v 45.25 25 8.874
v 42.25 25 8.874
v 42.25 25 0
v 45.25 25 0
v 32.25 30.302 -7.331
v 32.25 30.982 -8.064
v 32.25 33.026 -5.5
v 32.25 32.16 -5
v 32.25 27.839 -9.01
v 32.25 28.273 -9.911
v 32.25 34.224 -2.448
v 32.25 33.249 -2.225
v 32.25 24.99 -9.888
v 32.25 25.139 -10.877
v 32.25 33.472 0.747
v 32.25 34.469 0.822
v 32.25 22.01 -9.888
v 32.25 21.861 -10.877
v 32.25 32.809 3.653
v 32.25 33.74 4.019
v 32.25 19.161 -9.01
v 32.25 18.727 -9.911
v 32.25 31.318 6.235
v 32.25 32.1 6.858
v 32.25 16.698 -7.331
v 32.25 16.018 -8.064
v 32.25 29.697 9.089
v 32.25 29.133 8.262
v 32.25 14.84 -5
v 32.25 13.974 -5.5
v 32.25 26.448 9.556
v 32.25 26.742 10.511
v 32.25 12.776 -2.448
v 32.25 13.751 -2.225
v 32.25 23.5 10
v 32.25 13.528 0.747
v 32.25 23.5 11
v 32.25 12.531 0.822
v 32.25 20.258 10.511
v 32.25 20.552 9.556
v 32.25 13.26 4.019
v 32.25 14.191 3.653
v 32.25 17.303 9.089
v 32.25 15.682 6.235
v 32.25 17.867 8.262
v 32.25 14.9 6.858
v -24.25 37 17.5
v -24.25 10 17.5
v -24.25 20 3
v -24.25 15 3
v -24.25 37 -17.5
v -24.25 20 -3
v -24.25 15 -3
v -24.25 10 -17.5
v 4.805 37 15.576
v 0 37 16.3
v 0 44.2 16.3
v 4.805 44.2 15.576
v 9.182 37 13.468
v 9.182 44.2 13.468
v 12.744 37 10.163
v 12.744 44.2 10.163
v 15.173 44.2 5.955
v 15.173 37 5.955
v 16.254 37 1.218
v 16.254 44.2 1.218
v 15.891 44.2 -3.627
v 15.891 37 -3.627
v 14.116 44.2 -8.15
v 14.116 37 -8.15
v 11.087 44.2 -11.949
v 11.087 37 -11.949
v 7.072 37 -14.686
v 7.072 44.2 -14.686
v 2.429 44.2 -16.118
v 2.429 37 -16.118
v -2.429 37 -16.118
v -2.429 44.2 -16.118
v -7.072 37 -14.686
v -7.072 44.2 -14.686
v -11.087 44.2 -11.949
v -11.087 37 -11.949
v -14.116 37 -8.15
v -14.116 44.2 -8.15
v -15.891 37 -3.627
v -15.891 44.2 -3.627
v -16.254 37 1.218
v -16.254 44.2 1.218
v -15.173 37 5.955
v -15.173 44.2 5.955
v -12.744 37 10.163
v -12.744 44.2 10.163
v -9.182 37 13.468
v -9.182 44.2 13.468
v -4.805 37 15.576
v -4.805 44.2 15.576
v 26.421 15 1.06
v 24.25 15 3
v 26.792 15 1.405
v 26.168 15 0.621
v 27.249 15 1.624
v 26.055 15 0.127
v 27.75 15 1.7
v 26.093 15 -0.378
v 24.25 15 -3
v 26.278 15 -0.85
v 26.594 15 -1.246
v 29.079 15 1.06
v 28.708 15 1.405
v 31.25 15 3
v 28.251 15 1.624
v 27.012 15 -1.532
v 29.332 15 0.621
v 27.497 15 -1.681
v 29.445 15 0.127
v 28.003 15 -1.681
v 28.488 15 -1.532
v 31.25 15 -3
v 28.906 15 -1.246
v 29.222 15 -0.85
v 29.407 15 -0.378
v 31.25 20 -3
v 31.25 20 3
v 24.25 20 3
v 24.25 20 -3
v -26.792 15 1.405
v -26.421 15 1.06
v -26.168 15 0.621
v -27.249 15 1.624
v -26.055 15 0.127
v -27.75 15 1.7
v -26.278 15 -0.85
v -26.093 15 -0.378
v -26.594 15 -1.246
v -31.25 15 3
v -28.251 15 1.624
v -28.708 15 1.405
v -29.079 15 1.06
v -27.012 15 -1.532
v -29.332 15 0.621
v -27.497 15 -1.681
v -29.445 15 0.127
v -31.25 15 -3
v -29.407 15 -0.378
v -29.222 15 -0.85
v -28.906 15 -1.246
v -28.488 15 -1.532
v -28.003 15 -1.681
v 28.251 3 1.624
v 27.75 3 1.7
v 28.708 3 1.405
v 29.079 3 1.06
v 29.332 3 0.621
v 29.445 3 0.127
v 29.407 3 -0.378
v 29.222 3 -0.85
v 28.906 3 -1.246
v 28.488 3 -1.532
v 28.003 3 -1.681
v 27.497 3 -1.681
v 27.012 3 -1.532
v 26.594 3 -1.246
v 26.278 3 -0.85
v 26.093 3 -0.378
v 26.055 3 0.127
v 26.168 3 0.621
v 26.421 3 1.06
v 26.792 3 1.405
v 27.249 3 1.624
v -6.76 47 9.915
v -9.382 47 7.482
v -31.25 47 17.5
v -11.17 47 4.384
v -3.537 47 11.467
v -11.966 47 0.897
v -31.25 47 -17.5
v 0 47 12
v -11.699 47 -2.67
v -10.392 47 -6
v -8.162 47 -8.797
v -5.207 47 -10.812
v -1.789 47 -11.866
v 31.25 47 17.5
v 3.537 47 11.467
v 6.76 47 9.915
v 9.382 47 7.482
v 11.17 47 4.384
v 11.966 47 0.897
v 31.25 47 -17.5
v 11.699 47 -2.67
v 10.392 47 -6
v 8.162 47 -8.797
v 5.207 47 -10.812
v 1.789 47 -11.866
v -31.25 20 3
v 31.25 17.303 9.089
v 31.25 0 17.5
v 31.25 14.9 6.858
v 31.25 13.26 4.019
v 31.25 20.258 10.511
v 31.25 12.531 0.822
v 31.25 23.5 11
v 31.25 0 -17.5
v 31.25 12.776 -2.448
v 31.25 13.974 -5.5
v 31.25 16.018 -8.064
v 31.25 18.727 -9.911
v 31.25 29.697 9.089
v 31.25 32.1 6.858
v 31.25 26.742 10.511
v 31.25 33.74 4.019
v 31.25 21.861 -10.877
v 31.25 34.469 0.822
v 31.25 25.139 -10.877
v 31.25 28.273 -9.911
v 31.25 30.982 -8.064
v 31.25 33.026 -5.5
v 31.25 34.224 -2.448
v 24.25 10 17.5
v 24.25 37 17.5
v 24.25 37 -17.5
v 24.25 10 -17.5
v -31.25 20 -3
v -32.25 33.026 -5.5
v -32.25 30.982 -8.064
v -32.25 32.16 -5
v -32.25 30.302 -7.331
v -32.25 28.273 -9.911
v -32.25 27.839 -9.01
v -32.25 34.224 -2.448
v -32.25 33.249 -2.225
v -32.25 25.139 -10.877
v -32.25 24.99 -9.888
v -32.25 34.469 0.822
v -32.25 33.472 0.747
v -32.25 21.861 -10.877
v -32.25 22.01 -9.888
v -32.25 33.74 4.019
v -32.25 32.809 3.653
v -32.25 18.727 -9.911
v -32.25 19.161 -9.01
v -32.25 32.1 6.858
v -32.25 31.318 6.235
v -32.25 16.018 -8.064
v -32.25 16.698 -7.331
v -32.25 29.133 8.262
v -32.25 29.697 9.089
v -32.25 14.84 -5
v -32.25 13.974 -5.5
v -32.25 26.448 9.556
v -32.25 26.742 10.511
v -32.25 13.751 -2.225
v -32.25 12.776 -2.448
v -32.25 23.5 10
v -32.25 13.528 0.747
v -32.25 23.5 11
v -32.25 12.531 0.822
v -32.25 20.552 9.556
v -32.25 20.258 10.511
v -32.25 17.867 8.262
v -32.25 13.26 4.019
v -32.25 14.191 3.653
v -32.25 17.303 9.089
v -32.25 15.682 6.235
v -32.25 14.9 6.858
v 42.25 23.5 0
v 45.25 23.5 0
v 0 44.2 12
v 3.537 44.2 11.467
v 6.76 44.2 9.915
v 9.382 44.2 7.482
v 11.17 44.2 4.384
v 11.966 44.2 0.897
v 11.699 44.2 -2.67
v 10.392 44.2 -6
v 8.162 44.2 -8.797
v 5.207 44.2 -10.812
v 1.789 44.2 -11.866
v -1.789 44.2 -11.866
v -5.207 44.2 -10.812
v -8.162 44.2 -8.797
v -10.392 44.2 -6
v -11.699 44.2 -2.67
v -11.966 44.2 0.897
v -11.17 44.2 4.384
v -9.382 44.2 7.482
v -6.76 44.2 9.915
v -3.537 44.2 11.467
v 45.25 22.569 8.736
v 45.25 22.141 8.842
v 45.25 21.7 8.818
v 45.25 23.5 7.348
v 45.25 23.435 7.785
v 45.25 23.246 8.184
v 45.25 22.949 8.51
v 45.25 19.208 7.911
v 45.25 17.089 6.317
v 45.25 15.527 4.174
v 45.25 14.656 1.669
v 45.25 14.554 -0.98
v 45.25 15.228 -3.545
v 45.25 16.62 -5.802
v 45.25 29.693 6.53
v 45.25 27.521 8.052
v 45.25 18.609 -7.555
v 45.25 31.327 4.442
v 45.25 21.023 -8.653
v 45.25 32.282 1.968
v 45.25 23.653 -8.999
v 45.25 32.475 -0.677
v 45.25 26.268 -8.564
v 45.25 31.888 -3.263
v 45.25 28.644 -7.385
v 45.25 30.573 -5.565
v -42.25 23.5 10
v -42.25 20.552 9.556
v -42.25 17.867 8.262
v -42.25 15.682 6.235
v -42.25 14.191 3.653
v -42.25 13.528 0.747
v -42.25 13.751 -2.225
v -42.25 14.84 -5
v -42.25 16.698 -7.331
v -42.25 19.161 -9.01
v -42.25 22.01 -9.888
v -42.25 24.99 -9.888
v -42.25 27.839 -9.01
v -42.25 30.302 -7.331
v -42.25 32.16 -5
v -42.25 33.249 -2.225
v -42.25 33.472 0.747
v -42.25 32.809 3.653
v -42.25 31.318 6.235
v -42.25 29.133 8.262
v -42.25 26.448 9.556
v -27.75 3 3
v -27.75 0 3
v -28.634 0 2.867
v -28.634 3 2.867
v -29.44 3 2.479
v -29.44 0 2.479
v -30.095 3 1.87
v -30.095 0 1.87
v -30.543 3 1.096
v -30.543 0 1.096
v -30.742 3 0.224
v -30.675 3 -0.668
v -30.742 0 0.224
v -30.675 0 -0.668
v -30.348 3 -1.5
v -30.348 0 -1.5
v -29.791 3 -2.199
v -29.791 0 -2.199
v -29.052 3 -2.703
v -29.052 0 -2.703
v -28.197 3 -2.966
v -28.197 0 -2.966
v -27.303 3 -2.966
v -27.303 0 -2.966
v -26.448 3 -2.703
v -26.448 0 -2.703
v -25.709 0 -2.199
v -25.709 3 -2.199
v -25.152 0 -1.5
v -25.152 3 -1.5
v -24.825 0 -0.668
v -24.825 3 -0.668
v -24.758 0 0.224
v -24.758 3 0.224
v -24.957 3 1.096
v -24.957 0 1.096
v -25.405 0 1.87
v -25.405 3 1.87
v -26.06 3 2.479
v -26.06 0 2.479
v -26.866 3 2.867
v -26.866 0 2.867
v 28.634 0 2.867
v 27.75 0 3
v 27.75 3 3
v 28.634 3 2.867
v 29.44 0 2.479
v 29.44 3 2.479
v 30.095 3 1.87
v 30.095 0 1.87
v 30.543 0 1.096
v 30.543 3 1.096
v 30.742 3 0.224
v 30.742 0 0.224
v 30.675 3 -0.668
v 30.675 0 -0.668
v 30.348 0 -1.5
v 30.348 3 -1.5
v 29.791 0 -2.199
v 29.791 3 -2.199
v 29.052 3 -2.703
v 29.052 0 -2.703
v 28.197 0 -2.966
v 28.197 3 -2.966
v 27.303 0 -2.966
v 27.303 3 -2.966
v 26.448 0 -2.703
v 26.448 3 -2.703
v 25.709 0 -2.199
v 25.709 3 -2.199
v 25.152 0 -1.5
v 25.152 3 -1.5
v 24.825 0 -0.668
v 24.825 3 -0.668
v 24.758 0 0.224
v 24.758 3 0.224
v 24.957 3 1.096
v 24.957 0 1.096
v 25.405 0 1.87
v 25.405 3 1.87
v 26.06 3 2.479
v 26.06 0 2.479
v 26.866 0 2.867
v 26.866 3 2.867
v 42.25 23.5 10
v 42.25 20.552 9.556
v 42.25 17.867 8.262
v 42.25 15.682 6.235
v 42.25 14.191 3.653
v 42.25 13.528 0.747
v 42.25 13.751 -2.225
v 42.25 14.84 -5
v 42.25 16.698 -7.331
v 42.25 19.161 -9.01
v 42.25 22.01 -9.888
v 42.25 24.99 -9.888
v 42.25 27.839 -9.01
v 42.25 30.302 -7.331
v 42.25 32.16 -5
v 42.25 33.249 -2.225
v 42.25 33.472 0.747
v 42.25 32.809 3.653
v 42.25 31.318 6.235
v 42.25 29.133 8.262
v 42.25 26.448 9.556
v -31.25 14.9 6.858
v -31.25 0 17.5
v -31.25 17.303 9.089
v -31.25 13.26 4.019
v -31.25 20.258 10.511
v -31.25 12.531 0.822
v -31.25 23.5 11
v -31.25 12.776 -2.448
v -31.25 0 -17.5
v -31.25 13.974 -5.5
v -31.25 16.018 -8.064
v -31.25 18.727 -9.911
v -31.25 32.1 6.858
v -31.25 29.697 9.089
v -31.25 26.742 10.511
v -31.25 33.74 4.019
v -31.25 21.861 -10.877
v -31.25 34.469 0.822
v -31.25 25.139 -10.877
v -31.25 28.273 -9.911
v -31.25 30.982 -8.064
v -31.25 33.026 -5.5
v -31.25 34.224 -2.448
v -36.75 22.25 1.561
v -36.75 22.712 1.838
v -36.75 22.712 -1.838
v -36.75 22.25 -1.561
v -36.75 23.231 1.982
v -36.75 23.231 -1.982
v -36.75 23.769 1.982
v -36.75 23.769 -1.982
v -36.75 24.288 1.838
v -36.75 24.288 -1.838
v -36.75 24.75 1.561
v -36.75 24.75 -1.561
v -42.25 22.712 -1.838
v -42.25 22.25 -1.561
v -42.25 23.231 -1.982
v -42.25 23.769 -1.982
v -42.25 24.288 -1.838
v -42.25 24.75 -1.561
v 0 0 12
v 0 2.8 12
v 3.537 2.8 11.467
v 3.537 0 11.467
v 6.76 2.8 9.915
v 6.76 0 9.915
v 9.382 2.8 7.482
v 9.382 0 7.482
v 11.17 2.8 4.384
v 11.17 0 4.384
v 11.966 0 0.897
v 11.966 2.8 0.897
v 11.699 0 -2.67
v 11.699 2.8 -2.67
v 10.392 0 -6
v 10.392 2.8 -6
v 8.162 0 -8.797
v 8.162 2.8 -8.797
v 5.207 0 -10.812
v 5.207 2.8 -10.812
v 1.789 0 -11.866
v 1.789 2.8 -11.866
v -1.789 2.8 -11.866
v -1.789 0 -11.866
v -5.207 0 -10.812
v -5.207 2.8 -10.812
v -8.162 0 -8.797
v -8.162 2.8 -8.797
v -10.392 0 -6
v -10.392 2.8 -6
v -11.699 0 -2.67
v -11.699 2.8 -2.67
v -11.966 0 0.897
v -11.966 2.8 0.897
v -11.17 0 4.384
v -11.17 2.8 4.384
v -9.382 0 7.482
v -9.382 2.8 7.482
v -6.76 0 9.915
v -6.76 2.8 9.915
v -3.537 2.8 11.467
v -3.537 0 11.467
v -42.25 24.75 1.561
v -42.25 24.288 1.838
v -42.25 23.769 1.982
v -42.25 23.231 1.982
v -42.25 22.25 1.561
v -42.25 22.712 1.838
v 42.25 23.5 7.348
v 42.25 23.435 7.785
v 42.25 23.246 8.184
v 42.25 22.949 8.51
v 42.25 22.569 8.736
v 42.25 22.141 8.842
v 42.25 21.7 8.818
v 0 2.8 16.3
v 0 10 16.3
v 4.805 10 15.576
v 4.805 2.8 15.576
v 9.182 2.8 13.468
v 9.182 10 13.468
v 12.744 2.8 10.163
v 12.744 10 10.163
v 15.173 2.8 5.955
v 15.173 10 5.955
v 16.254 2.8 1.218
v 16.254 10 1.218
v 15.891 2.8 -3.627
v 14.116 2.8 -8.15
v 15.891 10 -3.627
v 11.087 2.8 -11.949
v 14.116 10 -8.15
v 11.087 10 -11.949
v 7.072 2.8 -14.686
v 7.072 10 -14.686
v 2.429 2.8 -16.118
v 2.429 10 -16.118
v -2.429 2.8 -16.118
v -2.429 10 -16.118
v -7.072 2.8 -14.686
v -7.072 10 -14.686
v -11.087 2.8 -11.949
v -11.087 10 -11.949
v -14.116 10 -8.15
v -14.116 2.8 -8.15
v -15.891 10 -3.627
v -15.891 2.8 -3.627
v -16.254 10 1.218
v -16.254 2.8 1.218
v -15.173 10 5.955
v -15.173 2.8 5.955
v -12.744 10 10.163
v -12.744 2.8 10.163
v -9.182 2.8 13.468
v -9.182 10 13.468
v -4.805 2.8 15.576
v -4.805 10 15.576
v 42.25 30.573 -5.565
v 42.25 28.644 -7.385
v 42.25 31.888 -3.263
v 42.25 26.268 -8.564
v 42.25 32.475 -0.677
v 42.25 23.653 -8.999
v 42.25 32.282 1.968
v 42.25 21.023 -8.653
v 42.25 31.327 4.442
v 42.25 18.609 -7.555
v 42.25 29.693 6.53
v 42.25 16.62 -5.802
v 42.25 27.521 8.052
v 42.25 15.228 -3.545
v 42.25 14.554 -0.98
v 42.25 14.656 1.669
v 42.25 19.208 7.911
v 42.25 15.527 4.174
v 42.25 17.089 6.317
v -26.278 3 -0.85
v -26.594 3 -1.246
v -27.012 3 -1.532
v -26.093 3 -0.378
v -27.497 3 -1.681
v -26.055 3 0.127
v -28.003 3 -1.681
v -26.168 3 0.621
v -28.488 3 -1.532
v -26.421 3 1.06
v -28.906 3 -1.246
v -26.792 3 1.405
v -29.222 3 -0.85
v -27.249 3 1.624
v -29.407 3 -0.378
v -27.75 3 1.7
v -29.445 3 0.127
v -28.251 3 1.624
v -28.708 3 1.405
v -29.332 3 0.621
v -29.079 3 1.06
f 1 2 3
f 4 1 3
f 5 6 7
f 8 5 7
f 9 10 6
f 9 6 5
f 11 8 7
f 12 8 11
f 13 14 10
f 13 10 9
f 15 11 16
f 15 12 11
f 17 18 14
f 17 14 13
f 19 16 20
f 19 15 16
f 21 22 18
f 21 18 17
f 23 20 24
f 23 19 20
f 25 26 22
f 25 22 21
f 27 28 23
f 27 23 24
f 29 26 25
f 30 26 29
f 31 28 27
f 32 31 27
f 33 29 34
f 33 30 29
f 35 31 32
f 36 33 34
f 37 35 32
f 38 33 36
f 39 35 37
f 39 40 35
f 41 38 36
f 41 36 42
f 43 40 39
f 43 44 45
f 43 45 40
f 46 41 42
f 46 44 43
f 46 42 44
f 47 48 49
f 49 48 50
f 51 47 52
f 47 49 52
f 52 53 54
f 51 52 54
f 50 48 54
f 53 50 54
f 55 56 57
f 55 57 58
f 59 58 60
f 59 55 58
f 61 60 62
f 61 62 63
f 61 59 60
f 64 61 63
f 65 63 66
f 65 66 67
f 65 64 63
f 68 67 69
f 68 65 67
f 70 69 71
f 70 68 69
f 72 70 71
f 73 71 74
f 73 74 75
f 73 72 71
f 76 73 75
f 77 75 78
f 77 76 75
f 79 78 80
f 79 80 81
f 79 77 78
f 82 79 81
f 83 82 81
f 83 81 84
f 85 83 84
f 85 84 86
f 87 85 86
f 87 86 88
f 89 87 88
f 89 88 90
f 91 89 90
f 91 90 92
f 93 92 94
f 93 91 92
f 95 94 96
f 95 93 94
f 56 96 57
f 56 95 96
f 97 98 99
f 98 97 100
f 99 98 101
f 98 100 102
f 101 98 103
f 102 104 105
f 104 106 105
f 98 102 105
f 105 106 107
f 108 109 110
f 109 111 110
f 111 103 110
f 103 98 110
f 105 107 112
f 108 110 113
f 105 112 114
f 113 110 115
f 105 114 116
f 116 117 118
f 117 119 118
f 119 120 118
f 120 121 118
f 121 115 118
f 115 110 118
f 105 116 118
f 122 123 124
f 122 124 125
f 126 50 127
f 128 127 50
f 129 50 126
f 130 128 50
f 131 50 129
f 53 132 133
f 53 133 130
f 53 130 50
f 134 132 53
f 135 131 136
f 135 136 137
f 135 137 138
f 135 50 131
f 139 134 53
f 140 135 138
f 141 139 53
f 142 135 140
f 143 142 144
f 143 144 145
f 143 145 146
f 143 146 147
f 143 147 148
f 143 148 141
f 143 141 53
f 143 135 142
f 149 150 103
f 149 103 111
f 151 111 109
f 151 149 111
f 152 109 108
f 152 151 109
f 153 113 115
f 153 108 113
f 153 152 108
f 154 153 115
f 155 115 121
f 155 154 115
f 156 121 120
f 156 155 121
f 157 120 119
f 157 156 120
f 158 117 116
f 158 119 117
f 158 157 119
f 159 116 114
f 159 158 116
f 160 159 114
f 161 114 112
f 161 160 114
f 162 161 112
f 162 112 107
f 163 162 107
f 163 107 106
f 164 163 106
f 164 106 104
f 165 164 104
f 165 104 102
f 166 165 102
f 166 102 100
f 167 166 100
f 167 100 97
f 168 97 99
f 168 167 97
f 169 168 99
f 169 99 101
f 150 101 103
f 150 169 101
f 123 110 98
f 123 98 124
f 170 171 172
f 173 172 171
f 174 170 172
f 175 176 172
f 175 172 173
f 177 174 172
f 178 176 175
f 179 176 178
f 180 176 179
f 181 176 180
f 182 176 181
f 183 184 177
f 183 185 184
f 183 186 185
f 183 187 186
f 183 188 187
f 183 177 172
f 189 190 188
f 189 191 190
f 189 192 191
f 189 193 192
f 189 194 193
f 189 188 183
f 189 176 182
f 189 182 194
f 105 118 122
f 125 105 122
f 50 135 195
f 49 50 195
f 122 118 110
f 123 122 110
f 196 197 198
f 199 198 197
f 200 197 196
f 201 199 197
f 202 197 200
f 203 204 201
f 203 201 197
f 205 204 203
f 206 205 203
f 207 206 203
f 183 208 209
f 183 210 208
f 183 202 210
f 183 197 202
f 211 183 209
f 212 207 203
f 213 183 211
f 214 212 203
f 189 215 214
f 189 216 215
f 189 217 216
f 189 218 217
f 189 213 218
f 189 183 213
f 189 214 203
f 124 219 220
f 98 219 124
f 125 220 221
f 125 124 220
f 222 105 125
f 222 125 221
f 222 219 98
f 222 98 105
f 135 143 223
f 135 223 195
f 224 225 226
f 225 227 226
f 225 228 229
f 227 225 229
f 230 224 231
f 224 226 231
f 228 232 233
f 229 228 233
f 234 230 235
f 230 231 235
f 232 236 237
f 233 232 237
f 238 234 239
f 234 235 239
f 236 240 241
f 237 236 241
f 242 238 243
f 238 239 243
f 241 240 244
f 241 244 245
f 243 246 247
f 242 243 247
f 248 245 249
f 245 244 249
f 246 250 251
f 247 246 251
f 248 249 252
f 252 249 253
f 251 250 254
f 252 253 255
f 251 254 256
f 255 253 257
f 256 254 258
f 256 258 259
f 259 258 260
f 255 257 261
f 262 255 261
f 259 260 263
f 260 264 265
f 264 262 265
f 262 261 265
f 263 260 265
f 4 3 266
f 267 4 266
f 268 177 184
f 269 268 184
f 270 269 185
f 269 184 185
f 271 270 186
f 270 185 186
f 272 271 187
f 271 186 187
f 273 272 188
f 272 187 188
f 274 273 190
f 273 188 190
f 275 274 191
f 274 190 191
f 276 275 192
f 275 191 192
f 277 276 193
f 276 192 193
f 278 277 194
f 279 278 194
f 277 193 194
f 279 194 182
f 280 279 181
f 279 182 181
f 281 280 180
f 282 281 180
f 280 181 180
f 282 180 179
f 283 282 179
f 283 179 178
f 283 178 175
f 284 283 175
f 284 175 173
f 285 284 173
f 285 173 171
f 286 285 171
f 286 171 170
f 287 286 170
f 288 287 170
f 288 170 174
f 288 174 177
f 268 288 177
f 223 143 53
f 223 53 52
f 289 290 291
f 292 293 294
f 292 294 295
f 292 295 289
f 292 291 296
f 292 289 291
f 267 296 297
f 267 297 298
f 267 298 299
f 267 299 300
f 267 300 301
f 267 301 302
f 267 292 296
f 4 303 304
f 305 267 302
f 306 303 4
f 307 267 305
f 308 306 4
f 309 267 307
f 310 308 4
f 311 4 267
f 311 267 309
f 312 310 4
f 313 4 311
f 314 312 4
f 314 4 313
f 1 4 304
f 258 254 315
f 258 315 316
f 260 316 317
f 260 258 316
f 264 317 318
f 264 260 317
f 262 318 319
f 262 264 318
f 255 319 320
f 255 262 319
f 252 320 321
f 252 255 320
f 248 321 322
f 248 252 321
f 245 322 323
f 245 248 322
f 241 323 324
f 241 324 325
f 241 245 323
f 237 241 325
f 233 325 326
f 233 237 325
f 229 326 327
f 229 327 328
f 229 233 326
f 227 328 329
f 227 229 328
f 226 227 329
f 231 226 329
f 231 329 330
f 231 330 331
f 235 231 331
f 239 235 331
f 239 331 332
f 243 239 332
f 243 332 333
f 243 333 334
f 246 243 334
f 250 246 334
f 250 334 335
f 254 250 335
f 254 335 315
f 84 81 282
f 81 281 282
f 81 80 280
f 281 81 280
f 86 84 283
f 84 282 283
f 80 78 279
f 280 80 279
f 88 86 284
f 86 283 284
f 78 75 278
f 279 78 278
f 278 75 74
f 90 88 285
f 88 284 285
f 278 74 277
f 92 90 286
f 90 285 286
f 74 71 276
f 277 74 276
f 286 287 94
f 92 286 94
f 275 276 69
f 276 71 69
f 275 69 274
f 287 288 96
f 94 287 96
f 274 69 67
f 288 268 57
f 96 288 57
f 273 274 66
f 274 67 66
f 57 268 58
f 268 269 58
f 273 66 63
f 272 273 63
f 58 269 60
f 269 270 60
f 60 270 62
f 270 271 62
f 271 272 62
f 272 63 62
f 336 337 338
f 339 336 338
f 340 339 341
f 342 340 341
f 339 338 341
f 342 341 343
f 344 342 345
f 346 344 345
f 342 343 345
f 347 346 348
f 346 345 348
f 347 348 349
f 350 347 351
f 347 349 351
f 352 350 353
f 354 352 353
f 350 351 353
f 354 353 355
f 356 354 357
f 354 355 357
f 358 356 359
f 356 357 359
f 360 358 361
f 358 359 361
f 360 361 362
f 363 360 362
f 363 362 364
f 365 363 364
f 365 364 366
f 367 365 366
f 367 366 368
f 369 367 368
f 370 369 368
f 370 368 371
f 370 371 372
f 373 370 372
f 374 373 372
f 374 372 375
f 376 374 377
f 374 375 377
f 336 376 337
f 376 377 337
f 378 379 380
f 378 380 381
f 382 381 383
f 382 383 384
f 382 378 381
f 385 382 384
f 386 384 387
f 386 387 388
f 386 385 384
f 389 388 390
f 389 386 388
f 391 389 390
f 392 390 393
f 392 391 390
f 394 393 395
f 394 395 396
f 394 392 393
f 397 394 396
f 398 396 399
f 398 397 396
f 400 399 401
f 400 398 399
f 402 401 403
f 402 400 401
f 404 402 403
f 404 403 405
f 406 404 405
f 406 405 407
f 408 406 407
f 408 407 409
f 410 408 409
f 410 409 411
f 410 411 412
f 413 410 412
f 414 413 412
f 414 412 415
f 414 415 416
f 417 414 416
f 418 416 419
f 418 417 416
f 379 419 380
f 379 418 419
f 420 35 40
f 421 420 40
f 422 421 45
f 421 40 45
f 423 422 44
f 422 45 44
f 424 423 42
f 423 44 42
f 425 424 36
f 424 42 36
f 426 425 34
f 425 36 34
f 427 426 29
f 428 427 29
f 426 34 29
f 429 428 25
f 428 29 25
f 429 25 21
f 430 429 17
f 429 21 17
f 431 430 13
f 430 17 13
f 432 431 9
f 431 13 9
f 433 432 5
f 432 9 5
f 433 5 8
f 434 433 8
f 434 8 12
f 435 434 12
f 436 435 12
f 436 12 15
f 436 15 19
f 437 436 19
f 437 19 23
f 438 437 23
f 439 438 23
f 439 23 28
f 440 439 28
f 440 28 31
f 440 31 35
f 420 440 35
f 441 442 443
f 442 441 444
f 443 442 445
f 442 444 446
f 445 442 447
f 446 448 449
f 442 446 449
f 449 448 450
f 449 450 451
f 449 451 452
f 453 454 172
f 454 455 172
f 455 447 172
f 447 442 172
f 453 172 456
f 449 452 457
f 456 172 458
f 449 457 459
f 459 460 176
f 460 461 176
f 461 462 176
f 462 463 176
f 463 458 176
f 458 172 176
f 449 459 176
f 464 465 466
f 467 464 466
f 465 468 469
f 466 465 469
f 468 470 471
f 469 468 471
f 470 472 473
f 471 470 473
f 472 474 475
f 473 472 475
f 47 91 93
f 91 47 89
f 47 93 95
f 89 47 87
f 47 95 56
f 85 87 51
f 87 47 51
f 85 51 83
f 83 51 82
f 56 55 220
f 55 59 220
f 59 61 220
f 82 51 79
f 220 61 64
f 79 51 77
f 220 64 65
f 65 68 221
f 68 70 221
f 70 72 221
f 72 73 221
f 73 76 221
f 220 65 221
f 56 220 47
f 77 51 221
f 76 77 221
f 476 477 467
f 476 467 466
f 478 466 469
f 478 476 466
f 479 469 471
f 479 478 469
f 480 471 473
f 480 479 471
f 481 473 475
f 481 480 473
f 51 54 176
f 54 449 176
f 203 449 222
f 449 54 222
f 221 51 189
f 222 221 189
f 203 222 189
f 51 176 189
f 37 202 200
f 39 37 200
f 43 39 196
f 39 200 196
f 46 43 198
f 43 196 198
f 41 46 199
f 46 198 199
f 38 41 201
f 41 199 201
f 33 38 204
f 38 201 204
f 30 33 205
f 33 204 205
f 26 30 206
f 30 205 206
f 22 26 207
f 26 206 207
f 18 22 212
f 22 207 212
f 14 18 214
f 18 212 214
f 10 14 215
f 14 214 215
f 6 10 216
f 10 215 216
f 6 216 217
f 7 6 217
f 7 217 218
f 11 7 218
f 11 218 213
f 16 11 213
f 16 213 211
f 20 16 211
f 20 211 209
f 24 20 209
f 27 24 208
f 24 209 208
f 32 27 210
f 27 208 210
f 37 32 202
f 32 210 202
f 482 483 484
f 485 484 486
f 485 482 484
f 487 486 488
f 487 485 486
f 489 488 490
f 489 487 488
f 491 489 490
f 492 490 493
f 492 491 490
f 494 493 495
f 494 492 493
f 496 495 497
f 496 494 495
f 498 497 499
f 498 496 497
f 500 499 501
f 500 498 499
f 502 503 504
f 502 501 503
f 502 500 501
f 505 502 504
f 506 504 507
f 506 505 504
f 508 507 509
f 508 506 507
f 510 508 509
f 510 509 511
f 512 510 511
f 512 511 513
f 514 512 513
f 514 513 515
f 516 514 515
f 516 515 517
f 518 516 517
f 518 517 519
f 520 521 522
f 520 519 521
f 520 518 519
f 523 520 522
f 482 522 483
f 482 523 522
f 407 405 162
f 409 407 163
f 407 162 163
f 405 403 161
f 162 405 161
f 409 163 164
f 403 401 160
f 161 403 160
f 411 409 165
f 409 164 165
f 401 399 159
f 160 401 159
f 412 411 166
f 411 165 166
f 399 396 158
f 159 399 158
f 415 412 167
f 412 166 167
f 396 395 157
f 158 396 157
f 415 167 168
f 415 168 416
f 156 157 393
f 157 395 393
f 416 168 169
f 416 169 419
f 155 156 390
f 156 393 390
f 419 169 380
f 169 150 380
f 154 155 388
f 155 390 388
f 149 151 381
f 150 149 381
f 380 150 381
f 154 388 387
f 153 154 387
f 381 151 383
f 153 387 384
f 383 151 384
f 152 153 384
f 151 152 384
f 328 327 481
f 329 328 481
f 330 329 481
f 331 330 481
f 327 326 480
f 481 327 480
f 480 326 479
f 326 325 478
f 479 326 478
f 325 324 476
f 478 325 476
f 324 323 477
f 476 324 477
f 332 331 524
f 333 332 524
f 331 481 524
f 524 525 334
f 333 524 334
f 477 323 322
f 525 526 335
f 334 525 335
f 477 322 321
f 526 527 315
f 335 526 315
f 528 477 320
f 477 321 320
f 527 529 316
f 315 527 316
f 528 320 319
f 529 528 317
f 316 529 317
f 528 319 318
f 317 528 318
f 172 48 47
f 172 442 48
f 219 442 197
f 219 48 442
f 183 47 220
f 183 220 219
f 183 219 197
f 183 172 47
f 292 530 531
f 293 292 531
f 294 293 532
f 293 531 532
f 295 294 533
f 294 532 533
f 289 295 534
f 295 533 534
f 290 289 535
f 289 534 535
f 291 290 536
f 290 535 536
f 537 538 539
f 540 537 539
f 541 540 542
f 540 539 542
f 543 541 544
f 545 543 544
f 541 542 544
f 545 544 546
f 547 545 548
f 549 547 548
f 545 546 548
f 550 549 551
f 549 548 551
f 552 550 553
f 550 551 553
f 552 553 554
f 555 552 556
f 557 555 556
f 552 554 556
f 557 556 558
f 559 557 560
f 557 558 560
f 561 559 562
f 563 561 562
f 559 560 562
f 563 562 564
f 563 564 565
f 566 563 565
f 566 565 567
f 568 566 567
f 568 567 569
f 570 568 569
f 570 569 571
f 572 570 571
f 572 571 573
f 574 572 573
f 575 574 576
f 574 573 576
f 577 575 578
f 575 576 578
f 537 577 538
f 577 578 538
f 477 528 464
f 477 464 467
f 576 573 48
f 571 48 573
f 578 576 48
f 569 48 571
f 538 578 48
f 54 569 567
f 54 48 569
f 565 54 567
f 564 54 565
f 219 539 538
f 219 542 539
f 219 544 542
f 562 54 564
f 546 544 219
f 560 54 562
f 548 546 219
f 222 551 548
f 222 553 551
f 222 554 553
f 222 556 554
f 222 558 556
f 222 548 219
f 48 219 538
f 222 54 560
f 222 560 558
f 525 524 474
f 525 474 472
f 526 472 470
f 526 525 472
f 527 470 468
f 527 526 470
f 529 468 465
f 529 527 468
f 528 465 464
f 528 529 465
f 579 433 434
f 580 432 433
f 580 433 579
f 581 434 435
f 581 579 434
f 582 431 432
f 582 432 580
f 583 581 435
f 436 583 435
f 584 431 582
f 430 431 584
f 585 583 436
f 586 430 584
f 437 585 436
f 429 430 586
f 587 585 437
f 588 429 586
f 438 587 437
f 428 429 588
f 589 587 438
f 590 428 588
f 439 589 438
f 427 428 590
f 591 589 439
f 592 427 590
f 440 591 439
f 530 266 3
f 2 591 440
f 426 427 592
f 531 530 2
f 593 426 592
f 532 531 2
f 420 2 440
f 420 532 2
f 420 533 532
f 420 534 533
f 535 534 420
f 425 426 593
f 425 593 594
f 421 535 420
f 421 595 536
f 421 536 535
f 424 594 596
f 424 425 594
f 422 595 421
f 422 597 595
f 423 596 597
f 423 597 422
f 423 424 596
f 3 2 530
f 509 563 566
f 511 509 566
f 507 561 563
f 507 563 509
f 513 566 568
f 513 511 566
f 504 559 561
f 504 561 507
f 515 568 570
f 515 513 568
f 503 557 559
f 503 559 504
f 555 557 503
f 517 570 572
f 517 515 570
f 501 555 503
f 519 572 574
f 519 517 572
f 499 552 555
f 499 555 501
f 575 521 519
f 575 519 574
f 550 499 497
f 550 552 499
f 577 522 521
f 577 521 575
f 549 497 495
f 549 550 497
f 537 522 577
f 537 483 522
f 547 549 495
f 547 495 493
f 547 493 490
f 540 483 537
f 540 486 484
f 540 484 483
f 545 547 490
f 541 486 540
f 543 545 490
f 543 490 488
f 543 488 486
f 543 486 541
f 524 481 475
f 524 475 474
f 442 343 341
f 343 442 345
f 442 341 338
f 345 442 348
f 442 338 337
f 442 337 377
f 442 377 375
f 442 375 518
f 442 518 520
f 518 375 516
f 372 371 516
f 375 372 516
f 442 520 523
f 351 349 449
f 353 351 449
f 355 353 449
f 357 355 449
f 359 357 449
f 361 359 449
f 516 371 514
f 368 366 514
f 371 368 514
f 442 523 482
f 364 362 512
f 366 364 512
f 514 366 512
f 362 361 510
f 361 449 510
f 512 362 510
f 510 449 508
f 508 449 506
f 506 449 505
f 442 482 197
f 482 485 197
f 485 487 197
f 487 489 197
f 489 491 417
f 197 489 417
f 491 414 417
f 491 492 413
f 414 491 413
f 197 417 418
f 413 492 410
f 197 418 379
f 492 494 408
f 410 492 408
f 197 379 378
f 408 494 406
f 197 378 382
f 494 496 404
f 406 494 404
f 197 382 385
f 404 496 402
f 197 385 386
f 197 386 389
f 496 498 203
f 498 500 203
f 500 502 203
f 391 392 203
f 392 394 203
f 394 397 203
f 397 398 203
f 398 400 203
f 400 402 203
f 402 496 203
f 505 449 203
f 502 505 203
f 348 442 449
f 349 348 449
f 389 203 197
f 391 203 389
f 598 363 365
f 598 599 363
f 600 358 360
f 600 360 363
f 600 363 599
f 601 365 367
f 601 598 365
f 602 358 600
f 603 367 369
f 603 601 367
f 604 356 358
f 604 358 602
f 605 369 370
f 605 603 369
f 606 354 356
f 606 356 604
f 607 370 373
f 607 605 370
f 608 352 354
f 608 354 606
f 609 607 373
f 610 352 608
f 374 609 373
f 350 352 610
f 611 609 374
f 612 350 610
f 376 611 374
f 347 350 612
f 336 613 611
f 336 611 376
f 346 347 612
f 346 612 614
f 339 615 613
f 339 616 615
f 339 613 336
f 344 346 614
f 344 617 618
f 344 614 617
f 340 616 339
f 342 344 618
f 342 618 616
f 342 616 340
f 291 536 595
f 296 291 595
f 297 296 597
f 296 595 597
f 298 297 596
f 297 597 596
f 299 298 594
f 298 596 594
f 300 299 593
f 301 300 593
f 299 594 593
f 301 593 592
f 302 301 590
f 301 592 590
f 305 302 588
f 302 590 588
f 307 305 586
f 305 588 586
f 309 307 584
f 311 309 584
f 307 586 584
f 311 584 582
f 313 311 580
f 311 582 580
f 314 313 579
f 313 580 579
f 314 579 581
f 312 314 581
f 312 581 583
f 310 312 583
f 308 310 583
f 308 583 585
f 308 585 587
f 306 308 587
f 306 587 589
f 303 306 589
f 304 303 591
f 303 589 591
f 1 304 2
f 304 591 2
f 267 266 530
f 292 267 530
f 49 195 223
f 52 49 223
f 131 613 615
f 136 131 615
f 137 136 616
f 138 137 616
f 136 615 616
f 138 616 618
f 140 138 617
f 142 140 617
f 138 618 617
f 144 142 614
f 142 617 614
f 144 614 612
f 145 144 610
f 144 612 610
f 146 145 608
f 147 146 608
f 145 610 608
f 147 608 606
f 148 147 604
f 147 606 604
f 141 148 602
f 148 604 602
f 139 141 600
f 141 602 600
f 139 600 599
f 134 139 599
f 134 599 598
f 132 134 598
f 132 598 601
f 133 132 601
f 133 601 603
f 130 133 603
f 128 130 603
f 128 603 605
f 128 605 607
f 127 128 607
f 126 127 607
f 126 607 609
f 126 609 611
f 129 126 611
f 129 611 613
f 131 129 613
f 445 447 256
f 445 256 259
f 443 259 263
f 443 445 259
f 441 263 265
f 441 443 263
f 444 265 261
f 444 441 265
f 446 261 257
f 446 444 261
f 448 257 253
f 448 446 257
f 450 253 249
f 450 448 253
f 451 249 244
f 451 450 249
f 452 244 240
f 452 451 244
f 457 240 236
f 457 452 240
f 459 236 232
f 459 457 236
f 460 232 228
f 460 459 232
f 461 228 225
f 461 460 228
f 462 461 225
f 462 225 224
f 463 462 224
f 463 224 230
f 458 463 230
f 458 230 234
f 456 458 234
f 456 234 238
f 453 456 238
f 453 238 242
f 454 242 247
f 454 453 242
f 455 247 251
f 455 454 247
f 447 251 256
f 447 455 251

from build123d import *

# Parameters (mm, degrees)
SKETCH_1_W          = 62.5
SKETCH_1_H          = 35
SKETCH_1_R          = 12
EXTRUDE_1_DEPTH     = 10
SKETCH_2_R          = 16.3
CUT_EXTRUDE_1_DEPTH = 7.2
SKETCH_4_W          = 7
SKETCH_4_H          = 35
EXTRUDE_3_DEPTH     = 37
SKETCH_5_R          = 3
CUT_EXTRUDE_3_DEPTH = 3
SKETCH_7_R          = 1.7
CUT_EXTRUDE_4_DEPTH = 20
SKETCH_9_W          = 6
SKETCH_9_H          = 5
CUT_EXTRUDE_5_DEPTH = 7
SKETCH_10_R         = 10
EXTRUDE_4_DEPTH     = 11
SKETCH_11_R         = 11
EXTRUDE_5_DEPTH     = 1
EXTRUDE_6_DEPTH     = 3
CUT_EXTRUDE_6_DEPTH = 5.5


with BuildPart() as part:
    # 草图1 → 凸台-拉伸1 (new body)
    with BuildSketch(Plane(origin=(0, 0, 0), x_dir=(1, 0, 0), z_dir=(0, 1, 0))):
        Rectangle(SKETCH_1_W, SKETCH_1_H)
        with Locations(Location((0, 0, 0), (0, 0, 270))):
            Circle(SKETCH_1_R, mode=Mode.SUBTRACT)
    extrude_1 = extrude(amount=EXTRUDE_1_DEPTH)

    # 草图2 → 切除-拉伸1 (cut)
    with BuildSketch(Plane(origin=(0, 10, 0), x_dir=(1, 0, 0), z_dir=(0, 1, 0))):
        with Locations(Location((0, 0, 0), (0, 0, 270))):
            Circle(SKETCH_2_R)
    cut_extrude_1 = extrude(amount=-CUT_EXTRUDE_1_DEPTH, mode=Mode.SUBTRACT)

    # 草图4 → 凸台-拉伸3 (add)
    with BuildSketch(Plane(origin=(0, 0, 0), x_dir=(1, 0, 0), z_dir=(0, 1, 0))):
        with Locations((27.75, 0)):
            Rectangle(SKETCH_4_W, SKETCH_4_H)
    extrude_3 = extrude(amount=EXTRUDE_3_DEPTH)

    # 草图5 → 切除-拉伸3 (cut)
    with BuildSketch(Plane(origin=(0, 0, 0), x_dir=(1, 0, 0), z_dir=(0, 1, 0))):
        with Locations(Location((27.75, 0, 0), (0, 0, 270))):
            Circle(SKETCH_5_R)
    cut_extrude_3 = extrude(amount=CUT_EXTRUDE_3_DEPTH, mode=Mode.SUBTRACT)

    # 草图7 → 切除-拉伸4 (cut)
    with BuildSketch(Plane(origin=(0, 0, 0), x_dir=(1, 0, 0), z_dir=(0, 1, 0))):
        with Locations(Location((27.75, 0, 0), (0, 0, 270))):
            Circle(SKETCH_7_R)
    cut_extrude_4 = extrude(amount=CUT_EXTRUDE_4_DEPTH, mode=Mode.SUBTRACT)

    # 草图9 → 切除-拉伸5 (cut)
    with BuildSketch(Plane(origin=(31.25, 0, 0), x_dir=(0, 0, -1), z_dir=(1, 0, 0))):
        with Locations((0, 17.5)):
            Rectangle(SKETCH_9_W, SKETCH_9_H)
    cut_extrude_5 = extrude(amount=-CUT_EXTRUDE_5_DEPTH, mode=Mode.SUBTRACT)

    # 镜向4: 凸台-拉伸3, 切除-拉伸3, 切除-拉伸4, 切除-拉伸5 across plane
    add(extrude_3.mirror(Plane.ZY))
    add(cut_extrude_3.mirror(Plane.ZY), mode=Mode.SUBTRACT)
    add(cut_extrude_4.mirror(Plane.ZY), mode=Mode.SUBTRACT)
    add(cut_extrude_5.mirror(Plane.ZY), mode=Mode.SUBTRACT)

    # 镜向5: 凸台-拉伸1, 切除-拉伸1 across plane
    add(extrude_1.mirror(Plane.ZX.offset(23.5)))
    add(cut_extrude_1.mirror(Plane.ZX.offset(23.5)), mode=Mode.SUBTRACT)

    # 草图10 → 凸台-拉伸4 (add)
    with BuildSketch(Plane(origin=(31.25, 0, 0), x_dir=(0, 0, -1), z_dir=(1, 0, 0))):
        with Locations(Location((0, 23.5, 0), (0, 0, 180))):
            Circle(SKETCH_10_R)
    extrude_4 = extrude(amount=EXTRUDE_4_DEPTH)

    # 草图11 → 凸台-拉伸5 (add)
    with BuildSketch(Plane(origin=(31.25, 0, 0), x_dir=(0, 0, -1), z_dir=(1, 0, 0))):
        with Locations(Location((0, 23.5, 0), (0, 0, 180))):
            Circle(SKETCH_11_R)
    extrude_5 = extrude(amount=EXTRUDE_5_DEPTH)

    # 镜向6: 凸台-拉伸4, 凸台-拉伸5 across plane
    add(extrude_4.mirror(Plane.ZY))
    add(extrude_5.mirror(Plane.ZY))

    # 草图12 → 凸台-拉伸6 (add)
    with BuildSketch(Plane(origin=(42.25, 0, 0), x_dir=(0, 0, -1), z_dir=(1, 0, 0))):
        with BuildLine():
            Line((0, 23.5), (-7.348469228, 23.5))
            ThreePointArc((-7.348469228, 23.5), (-8.510364232, 22.948683298), (-8.818163074, 21.7))
            ThreePointArc((-8.818163074, 21.7), (8.998706419, 23.652586976), (-8.874119675, 25))
            Line((-8.874119675, 25), (0, 25))
            Line((0, 25), (0, 23.5))
        make_face()
    extrude(amount=EXTRUDE_6_DEPTH)

    # 草图13 → 切除-拉伸6 (cut)
    with BuildSketch(Plane.ZY.offset(42.25)):
        with BuildLine():
            Line((-1.5612495, 24.75), (1.5612495, 24.75))
            ThreePointArc((1.5612495, 24.75), (2, 23.5), (1.5612495, 22.25))
            Line((1.5612495, 22.25), (-1.5612495, 22.25))
            ThreePointArc((-1.5612495, 22.25), (-2, 23.5), (-1.5612495, 24.75))
        make_face()
    extrude(amount=-CUT_EXTRUDE_6_DEPTH, mode=Mode.SUBTRACT)


solid = part.part
